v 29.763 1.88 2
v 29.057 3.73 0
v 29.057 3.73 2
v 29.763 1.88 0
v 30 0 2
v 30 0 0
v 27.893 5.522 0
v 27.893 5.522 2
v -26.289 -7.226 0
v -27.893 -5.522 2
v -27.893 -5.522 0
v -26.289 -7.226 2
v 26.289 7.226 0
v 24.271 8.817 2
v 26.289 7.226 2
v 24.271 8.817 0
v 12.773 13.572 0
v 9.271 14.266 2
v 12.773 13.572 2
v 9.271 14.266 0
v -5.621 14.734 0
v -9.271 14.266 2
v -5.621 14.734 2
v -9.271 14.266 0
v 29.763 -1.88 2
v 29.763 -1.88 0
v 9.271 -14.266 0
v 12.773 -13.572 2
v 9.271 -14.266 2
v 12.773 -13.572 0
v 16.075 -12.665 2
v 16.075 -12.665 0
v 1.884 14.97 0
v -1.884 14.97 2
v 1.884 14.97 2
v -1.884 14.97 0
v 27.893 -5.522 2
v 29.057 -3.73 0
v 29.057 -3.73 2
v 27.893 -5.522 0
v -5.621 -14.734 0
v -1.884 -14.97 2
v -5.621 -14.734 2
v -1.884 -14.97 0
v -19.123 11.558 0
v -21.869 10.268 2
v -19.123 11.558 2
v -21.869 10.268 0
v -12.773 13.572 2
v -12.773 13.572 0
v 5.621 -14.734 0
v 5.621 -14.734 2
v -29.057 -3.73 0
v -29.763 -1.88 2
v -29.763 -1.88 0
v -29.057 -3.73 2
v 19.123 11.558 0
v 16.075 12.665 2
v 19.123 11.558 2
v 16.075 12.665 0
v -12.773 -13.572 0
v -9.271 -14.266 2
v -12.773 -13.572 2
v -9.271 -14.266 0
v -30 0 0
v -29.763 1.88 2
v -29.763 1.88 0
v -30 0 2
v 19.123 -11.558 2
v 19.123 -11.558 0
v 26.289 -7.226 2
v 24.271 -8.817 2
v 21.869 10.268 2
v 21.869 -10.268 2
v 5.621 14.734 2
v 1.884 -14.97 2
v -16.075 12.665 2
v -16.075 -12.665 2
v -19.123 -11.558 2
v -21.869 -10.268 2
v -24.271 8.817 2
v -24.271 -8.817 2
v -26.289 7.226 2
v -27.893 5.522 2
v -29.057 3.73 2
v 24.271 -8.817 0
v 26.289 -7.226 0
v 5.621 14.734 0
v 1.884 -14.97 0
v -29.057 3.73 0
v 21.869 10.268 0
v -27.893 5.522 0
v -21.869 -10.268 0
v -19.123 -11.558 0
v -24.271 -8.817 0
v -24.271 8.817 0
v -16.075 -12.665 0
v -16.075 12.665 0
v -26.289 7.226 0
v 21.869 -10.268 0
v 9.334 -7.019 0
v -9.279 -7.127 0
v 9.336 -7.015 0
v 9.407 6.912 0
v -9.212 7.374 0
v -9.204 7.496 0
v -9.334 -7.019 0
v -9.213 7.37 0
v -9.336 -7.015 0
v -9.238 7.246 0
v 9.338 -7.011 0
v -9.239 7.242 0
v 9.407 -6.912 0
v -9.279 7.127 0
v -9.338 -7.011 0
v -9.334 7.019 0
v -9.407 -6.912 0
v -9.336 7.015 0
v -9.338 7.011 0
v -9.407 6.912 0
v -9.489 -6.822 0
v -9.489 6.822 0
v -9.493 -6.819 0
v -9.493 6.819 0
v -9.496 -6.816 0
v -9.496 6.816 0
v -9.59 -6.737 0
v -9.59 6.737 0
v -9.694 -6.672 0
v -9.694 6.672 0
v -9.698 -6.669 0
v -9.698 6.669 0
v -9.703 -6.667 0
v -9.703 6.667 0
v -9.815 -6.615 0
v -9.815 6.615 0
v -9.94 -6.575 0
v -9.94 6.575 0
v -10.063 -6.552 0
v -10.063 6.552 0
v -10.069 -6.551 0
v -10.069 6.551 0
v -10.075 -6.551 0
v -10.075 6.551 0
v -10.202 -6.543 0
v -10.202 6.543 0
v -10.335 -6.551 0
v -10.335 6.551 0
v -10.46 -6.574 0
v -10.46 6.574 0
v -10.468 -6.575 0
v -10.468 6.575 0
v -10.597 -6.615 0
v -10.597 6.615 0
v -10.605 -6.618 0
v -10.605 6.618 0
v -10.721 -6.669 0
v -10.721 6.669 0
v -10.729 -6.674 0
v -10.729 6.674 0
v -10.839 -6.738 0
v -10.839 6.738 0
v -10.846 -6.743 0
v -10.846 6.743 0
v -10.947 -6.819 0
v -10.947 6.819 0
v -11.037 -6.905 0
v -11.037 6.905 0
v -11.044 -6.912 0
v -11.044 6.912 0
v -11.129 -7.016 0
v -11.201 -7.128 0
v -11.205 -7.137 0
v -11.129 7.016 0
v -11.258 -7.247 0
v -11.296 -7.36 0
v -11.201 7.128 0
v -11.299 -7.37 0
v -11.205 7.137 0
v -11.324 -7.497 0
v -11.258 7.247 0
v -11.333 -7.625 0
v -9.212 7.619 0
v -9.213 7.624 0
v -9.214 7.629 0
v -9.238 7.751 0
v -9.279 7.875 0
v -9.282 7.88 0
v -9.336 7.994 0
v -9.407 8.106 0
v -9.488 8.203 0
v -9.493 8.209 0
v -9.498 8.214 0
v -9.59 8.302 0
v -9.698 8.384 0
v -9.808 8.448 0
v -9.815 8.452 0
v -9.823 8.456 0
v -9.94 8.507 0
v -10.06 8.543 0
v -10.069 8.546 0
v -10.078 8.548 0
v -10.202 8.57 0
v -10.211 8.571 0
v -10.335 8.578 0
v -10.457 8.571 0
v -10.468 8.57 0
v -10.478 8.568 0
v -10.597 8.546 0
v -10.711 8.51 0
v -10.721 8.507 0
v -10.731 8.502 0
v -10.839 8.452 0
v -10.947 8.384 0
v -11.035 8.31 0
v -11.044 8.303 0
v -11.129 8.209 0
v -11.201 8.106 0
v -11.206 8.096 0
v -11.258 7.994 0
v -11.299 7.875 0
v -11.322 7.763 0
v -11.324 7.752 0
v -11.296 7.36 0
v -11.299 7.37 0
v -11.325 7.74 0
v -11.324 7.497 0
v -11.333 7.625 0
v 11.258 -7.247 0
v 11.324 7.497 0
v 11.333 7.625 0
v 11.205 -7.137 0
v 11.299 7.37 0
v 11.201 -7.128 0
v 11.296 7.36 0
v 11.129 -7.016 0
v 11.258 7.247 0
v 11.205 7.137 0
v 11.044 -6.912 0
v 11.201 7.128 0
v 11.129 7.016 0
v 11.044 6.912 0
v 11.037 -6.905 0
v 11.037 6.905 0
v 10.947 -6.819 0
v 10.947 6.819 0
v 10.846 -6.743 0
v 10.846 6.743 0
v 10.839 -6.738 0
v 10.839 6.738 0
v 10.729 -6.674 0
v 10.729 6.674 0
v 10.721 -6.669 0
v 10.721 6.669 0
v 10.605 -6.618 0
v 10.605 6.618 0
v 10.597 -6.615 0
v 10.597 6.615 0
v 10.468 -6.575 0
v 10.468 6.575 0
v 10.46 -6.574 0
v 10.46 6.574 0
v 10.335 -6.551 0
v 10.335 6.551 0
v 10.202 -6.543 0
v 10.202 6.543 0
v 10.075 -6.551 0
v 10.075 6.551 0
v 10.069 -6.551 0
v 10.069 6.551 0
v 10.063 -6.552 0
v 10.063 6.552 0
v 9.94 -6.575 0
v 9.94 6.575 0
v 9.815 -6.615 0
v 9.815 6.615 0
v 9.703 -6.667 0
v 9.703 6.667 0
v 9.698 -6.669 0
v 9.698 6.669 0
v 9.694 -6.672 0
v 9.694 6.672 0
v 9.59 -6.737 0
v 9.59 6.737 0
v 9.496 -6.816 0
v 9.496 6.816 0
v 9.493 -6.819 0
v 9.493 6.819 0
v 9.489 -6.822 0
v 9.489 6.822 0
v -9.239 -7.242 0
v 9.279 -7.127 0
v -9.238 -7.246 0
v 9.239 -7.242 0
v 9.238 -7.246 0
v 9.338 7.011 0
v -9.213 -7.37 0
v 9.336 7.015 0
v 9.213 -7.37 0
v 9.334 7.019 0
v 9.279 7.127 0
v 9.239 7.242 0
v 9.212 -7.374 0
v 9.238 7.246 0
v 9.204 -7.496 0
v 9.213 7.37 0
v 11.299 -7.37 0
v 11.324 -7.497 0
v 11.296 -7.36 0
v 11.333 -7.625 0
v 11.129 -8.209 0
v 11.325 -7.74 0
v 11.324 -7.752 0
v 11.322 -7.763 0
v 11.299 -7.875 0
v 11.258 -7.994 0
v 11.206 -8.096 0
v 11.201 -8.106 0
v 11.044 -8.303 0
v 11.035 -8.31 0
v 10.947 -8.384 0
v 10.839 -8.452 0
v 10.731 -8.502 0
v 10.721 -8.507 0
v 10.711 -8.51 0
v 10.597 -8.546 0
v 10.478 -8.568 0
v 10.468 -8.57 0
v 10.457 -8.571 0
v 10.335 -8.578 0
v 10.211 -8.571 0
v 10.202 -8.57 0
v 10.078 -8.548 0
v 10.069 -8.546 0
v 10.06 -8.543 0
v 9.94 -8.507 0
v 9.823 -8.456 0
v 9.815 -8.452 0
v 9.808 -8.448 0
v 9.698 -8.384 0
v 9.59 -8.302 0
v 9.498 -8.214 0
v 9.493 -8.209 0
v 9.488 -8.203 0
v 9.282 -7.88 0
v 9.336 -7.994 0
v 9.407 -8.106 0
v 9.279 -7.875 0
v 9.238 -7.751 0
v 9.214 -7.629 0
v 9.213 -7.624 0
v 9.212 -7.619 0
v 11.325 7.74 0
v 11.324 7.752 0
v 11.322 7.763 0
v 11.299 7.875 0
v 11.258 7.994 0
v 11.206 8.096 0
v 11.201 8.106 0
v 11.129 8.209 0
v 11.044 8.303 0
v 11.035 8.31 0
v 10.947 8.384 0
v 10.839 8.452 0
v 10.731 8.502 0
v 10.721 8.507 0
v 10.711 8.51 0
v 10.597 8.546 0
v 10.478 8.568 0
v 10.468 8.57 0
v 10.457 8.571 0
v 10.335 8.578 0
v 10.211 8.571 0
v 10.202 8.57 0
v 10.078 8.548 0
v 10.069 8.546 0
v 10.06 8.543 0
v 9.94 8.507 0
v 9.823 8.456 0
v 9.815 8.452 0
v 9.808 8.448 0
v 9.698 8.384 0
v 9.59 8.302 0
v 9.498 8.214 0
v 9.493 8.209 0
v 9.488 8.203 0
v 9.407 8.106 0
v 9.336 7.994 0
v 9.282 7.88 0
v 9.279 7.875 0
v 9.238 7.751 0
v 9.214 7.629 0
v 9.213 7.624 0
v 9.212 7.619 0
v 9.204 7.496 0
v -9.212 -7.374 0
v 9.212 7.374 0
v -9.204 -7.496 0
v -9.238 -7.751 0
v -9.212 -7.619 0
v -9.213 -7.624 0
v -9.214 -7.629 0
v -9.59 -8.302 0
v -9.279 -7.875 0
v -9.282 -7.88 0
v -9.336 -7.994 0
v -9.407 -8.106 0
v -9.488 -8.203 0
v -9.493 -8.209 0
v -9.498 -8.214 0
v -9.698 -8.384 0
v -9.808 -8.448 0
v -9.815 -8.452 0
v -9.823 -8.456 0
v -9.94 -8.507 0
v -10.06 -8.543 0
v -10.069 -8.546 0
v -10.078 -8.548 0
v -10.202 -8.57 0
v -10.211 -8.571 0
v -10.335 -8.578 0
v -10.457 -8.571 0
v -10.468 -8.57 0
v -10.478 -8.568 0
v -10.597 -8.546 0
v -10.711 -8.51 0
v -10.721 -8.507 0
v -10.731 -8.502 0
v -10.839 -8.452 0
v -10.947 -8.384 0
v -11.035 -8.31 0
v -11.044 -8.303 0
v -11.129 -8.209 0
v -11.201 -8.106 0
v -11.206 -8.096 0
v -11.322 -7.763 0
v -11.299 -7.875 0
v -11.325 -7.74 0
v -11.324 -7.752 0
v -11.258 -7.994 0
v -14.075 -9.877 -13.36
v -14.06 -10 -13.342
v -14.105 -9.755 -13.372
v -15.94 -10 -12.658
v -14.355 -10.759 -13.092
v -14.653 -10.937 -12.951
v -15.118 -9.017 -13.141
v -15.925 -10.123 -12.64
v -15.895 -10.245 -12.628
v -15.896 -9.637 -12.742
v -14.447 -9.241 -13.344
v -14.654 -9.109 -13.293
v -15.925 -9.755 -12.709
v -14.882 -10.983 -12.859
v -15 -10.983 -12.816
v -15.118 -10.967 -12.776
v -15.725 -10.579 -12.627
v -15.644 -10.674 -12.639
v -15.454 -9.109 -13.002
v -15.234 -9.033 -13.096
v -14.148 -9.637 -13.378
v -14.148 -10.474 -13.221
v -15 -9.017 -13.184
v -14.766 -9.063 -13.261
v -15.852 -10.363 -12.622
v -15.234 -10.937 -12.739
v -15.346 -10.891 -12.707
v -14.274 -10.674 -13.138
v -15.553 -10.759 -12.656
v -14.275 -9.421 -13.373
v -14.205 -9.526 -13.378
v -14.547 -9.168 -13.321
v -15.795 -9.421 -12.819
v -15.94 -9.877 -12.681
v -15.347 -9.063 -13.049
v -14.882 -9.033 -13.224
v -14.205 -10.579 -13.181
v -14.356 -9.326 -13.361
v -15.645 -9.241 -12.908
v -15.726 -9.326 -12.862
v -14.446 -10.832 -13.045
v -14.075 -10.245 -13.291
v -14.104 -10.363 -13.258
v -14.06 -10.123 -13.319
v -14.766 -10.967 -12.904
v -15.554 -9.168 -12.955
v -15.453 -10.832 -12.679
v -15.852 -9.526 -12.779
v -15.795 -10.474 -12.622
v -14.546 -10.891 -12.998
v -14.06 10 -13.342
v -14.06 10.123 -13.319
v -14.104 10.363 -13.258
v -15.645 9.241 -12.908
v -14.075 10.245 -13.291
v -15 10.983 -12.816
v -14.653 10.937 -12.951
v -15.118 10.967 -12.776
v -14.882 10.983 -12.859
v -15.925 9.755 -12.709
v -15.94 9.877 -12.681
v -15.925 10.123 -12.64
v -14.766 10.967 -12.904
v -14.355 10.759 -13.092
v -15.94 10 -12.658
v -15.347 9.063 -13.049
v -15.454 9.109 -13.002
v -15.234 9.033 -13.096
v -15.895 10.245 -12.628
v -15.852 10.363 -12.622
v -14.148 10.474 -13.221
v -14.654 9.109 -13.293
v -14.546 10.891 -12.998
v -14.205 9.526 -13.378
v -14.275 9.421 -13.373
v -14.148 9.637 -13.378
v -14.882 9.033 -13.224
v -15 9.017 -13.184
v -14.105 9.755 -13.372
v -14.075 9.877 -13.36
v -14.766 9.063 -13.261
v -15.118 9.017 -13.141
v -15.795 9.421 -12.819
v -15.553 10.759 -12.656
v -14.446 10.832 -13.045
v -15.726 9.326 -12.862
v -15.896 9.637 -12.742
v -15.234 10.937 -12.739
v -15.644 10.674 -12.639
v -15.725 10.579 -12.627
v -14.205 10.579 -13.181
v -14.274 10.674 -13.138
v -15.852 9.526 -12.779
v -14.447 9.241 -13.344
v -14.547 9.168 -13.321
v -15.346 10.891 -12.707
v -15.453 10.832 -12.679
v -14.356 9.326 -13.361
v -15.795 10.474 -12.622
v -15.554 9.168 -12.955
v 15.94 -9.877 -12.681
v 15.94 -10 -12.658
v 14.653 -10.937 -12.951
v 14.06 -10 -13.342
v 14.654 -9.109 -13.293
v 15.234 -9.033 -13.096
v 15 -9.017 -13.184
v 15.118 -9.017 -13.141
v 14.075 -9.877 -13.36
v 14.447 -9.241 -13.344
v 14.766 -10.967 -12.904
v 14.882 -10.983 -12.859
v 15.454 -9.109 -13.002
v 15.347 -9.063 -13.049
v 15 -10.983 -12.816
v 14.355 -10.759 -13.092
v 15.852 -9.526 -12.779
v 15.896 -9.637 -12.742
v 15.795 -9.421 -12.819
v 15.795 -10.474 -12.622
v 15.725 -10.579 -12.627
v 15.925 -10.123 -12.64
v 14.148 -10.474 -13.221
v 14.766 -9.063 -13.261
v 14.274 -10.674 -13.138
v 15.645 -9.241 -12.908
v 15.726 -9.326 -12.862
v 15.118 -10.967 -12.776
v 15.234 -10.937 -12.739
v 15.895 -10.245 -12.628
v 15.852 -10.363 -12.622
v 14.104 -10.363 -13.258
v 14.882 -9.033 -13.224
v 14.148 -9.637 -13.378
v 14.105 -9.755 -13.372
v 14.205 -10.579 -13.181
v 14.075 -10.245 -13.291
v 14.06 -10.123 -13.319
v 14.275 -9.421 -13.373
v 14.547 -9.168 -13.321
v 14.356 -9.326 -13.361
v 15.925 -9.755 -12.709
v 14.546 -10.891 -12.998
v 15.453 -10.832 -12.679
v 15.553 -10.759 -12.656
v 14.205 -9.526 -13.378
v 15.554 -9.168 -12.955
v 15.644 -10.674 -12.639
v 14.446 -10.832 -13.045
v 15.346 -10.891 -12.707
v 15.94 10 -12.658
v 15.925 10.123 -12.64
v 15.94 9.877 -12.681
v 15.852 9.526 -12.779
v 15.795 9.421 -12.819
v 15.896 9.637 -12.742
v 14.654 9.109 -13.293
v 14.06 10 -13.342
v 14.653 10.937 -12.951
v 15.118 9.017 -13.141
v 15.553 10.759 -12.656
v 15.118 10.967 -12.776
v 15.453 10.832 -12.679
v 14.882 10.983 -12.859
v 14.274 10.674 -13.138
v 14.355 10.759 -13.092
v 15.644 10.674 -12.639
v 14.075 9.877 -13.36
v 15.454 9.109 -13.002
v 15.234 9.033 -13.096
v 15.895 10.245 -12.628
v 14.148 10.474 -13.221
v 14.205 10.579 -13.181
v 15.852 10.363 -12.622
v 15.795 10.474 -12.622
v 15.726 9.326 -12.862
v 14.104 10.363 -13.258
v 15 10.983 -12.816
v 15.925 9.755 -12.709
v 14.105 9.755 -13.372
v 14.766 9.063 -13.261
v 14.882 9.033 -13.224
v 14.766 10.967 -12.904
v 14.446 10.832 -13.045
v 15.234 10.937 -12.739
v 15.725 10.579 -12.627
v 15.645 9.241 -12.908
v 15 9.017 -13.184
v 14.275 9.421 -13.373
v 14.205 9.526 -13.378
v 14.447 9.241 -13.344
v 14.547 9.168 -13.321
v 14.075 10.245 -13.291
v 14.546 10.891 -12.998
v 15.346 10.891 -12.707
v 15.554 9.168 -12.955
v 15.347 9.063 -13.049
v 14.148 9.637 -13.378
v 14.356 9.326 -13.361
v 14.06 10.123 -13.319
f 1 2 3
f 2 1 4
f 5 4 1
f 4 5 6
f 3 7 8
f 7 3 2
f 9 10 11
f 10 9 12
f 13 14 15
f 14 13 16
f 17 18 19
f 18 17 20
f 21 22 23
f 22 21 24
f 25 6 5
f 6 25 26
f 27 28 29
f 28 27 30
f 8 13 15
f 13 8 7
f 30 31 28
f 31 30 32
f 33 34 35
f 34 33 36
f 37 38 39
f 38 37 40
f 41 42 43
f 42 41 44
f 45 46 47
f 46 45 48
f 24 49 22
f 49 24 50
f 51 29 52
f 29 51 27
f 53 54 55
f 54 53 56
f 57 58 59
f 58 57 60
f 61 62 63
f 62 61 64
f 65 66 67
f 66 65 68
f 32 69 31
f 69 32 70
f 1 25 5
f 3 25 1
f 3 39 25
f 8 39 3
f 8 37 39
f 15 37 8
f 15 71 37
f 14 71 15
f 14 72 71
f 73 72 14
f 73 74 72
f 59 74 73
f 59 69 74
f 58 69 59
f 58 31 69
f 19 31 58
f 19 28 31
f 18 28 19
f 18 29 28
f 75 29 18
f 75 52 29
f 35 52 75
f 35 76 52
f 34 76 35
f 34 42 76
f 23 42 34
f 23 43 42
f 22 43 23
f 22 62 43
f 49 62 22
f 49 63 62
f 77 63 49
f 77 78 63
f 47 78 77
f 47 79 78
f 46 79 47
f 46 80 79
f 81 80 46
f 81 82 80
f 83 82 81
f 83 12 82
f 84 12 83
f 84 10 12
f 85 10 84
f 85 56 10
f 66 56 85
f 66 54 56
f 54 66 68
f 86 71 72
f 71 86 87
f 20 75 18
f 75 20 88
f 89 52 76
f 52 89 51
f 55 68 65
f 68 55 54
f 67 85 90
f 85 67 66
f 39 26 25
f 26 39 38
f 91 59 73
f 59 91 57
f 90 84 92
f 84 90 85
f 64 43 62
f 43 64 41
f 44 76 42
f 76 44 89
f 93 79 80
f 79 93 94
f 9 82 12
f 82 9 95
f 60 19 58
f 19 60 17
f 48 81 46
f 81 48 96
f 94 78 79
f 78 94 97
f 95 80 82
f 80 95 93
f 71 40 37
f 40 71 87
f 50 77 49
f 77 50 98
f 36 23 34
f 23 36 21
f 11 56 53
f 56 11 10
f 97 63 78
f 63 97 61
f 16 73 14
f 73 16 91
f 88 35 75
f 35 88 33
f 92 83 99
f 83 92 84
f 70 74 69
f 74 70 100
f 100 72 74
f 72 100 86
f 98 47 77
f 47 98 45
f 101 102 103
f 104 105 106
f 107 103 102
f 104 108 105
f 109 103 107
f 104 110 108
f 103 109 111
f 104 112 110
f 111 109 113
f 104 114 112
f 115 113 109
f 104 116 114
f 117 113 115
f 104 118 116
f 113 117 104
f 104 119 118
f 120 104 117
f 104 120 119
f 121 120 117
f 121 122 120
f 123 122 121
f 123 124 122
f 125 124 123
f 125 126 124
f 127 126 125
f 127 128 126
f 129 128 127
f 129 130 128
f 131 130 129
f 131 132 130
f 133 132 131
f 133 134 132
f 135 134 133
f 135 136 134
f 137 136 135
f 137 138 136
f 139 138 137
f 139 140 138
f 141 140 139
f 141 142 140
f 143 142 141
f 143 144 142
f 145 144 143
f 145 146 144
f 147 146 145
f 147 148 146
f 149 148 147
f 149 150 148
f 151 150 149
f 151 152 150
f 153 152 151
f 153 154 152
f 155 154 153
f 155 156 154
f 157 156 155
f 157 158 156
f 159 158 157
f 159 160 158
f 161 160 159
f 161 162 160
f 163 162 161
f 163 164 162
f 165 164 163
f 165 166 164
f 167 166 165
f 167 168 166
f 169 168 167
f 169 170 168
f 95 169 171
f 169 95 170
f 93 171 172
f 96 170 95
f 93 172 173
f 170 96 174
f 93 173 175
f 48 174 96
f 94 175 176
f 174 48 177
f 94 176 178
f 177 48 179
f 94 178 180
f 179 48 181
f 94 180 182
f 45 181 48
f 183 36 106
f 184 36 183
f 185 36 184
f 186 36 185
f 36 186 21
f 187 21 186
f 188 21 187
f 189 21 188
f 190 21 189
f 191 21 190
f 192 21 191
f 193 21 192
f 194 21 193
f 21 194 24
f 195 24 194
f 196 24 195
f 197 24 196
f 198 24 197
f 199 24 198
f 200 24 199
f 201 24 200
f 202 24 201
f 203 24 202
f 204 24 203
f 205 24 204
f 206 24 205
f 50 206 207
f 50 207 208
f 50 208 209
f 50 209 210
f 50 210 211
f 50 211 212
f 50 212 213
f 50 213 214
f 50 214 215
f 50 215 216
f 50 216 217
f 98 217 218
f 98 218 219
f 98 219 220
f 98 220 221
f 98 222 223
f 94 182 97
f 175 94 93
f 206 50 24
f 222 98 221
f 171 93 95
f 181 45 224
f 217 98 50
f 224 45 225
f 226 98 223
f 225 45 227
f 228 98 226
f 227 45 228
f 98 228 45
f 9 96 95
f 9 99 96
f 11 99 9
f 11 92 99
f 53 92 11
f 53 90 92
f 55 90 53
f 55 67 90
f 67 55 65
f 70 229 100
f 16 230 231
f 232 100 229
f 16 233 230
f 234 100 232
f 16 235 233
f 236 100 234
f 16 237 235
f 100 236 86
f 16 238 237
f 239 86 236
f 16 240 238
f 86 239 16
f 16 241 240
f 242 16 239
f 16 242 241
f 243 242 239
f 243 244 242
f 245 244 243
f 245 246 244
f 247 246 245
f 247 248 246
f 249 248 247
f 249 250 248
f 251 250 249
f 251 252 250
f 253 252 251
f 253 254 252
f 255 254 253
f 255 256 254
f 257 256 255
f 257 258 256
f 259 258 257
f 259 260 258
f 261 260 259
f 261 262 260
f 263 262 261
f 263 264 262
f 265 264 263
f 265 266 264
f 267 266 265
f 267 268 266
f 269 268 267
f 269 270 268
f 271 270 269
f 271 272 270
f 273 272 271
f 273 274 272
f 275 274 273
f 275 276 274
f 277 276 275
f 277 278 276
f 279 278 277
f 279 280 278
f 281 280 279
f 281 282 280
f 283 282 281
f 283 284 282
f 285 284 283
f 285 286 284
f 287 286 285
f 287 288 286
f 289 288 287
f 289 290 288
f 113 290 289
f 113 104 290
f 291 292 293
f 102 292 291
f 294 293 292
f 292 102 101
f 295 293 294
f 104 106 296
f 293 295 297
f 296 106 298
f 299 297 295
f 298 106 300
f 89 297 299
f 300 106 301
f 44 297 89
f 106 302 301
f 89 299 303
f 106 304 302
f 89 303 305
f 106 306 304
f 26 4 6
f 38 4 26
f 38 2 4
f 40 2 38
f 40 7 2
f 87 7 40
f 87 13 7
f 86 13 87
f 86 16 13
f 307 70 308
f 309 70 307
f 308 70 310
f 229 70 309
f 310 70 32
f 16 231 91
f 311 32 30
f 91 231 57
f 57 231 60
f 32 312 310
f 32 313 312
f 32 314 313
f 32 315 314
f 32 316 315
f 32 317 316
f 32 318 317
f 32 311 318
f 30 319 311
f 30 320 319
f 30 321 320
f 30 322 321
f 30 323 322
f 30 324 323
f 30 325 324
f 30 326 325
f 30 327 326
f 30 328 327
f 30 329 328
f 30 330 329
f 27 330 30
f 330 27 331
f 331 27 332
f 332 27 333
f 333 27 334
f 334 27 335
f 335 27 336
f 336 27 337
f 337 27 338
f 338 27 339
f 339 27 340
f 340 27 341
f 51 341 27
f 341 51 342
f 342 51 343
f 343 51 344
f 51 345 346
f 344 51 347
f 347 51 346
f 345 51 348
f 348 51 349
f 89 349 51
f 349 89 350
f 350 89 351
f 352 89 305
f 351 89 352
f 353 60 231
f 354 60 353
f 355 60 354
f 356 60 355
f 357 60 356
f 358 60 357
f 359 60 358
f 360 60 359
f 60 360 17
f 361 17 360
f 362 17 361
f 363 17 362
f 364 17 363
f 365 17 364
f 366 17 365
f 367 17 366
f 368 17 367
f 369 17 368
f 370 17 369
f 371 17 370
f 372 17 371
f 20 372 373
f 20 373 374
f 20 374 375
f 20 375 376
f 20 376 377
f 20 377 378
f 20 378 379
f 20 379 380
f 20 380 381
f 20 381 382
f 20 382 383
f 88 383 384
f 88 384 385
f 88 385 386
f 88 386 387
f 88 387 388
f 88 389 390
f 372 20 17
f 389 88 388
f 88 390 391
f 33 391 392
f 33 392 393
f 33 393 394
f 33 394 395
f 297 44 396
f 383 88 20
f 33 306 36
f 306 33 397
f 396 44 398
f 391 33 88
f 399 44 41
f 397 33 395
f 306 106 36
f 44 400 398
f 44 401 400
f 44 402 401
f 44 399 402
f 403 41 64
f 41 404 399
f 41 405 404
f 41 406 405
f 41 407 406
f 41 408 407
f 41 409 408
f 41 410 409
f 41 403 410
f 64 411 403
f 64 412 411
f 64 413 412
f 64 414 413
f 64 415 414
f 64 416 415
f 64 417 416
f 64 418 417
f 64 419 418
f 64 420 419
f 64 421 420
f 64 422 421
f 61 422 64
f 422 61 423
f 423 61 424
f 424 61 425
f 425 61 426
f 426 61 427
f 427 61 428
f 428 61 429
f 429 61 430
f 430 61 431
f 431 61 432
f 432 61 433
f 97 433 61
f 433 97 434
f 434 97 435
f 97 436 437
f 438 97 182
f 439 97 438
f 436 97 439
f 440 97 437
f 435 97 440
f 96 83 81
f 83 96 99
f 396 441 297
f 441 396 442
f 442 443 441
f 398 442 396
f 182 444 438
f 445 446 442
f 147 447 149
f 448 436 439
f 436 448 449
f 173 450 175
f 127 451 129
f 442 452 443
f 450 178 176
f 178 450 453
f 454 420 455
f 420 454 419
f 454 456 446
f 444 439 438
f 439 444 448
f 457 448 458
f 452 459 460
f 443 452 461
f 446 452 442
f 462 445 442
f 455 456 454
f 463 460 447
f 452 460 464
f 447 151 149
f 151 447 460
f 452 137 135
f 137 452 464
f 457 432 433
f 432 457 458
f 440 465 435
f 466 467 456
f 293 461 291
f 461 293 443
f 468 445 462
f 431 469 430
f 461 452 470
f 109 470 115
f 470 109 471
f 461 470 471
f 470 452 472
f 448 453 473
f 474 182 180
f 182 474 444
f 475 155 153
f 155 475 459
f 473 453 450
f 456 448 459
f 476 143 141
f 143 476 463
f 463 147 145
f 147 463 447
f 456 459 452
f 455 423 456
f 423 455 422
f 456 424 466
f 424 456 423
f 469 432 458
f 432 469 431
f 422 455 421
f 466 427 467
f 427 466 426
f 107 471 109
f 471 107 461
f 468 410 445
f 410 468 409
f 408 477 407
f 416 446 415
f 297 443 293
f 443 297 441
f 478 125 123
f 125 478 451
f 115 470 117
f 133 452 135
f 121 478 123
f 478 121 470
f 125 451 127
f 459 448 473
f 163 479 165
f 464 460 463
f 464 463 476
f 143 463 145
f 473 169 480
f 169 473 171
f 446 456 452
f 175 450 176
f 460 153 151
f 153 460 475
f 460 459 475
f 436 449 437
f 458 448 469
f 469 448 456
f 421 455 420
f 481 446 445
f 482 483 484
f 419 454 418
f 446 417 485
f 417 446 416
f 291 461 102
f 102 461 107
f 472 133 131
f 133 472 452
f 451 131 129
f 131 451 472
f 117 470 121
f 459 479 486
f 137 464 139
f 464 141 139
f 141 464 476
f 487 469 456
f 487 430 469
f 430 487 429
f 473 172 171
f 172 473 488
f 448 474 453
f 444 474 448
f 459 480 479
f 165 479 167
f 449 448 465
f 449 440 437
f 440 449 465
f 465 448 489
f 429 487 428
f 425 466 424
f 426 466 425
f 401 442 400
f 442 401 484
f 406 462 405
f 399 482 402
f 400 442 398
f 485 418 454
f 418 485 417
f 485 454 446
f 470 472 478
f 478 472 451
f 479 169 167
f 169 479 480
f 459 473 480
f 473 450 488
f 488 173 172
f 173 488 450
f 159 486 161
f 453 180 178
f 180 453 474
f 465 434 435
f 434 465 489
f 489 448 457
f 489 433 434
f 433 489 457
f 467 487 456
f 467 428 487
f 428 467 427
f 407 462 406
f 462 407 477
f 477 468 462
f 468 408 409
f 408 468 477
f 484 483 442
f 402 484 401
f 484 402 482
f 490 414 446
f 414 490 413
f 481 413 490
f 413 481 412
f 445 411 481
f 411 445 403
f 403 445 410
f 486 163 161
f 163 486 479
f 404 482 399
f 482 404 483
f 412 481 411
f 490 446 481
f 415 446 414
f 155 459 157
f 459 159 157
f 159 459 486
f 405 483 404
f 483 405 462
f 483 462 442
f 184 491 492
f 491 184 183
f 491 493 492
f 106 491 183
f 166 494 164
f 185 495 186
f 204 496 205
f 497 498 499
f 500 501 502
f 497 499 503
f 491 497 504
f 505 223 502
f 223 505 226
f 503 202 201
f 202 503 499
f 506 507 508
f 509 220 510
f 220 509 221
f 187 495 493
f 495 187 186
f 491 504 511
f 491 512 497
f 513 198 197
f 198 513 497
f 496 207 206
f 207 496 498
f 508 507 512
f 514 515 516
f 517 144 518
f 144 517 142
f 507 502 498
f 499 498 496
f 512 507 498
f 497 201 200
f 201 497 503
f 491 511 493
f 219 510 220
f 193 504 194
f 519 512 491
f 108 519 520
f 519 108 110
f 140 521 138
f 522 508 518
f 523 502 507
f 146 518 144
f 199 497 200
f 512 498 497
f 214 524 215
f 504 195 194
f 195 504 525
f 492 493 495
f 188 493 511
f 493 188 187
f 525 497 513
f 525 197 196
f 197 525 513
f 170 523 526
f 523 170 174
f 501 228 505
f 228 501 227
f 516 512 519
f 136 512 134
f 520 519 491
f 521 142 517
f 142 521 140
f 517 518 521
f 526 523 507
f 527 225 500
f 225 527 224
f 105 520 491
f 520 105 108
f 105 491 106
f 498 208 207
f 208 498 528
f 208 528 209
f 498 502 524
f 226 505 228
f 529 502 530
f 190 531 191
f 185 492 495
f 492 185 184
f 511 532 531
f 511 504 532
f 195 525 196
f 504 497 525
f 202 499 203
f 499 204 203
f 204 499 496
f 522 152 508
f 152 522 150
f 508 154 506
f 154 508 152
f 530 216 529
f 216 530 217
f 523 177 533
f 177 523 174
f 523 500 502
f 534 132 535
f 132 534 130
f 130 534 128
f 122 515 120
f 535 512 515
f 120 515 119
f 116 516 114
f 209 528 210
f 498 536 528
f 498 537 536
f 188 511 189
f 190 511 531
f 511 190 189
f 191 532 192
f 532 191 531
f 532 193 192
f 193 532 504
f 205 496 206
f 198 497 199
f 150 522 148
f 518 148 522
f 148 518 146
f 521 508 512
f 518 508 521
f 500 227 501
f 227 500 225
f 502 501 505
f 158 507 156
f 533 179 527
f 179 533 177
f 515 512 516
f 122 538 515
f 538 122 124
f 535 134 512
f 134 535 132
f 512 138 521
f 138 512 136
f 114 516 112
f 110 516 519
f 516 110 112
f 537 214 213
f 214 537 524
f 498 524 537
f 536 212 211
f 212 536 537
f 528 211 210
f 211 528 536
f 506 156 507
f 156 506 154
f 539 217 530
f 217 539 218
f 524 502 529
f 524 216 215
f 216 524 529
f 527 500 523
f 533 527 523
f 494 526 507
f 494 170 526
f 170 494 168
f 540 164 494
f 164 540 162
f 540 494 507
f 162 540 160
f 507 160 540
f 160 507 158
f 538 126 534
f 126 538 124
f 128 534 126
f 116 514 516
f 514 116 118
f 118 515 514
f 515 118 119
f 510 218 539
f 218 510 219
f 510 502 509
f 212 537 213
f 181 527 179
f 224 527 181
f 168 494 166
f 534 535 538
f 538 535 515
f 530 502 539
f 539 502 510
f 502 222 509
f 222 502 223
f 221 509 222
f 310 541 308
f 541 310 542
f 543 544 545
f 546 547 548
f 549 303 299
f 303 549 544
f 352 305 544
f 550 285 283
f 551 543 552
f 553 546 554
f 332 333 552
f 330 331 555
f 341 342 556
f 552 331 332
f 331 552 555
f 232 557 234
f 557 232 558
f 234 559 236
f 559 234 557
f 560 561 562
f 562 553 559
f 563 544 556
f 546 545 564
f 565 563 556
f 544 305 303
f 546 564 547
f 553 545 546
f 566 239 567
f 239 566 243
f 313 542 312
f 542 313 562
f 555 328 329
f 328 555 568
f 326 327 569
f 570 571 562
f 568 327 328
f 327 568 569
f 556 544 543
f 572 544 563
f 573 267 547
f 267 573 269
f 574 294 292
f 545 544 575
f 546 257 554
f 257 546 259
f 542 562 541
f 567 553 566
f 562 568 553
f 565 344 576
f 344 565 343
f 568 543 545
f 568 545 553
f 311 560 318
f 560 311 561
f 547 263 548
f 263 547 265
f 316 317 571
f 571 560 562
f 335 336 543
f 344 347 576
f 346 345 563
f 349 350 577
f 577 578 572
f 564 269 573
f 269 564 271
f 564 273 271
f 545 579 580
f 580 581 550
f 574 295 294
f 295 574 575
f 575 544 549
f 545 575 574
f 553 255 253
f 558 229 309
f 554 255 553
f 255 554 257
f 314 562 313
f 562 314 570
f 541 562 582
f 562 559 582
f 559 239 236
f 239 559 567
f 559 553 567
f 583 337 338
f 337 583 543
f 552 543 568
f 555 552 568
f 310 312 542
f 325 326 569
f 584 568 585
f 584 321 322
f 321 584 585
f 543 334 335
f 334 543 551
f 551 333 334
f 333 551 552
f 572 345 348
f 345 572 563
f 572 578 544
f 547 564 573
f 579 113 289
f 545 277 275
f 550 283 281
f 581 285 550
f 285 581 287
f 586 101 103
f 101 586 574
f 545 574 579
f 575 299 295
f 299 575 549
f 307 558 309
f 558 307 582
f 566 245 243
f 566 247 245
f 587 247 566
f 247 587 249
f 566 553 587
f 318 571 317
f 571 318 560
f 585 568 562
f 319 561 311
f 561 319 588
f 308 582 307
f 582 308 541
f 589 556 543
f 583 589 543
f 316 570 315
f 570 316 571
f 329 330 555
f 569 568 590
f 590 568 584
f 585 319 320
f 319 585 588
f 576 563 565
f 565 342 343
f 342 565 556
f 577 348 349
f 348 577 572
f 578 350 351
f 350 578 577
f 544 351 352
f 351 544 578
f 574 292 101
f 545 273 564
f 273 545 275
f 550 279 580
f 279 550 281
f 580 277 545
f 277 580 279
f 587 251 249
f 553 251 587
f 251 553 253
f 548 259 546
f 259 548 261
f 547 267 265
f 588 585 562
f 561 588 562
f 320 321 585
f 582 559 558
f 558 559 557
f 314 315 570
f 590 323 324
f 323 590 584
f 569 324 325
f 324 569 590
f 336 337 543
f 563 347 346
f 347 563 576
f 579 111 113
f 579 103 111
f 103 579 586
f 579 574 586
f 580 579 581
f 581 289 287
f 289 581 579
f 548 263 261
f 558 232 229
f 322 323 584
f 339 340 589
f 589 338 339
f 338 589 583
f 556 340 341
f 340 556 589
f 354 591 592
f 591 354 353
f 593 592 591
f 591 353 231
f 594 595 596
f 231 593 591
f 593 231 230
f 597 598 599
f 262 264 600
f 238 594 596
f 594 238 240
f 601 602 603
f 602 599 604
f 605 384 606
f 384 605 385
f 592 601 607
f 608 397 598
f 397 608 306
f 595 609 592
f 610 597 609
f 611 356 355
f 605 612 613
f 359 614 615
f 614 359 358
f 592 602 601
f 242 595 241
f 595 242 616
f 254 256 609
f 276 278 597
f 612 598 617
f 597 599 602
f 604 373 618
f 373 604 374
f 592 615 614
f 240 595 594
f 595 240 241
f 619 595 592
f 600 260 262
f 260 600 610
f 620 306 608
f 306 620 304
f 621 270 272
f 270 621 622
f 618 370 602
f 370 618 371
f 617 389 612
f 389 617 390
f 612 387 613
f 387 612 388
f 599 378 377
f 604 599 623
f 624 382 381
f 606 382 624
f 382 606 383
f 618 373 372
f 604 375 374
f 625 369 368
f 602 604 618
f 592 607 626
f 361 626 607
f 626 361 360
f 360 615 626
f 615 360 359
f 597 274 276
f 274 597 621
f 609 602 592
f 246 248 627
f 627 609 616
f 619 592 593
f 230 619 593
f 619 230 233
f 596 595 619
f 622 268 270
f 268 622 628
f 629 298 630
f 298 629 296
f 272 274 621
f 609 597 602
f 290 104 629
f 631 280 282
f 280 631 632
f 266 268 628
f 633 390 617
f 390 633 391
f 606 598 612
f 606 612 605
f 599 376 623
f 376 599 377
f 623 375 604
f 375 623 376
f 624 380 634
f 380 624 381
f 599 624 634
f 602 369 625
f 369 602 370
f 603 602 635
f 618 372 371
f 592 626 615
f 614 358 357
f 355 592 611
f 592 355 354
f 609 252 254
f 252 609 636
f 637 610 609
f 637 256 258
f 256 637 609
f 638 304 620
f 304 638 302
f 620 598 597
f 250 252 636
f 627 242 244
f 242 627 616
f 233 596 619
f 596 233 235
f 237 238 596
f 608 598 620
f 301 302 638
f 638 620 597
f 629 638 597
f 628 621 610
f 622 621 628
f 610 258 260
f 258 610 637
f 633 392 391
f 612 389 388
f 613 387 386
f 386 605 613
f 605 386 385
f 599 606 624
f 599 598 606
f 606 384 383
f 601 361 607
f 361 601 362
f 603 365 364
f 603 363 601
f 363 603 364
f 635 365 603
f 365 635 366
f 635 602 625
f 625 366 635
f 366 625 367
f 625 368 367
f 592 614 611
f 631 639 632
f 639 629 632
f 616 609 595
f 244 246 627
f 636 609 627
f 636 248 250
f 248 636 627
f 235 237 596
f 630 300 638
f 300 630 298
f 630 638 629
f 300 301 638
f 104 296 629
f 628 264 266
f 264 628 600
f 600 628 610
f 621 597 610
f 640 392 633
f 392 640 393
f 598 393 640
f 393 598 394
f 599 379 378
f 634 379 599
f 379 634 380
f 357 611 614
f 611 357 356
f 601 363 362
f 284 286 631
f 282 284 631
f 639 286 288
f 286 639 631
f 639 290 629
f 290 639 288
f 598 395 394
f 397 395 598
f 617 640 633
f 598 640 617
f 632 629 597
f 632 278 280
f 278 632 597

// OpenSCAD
// Transforming Shapes - Design Time: Modern Table

$fn = 50;

scale([3, 1.5, 1]) cylinder(h=2, r1=10, r2=10); // table top

translate([-15, -10, -13]) rotate([-10, 20, 0]) cylinder(h=15, r1=1, r2=1); // left legs
translate([-15, 10, -13]) rotate([10, 20, 0]) cylinder(h=15, r1=1, r2=1);

translate([15, -10, -13]) rotate([-10, -20, 0]) cylinder(h=15, r1=1, r2=1); // right legs
translate([15, 10,-13]) rotate([10, -20, 0]) cylinder(h=15, r1=1, r2=1);
